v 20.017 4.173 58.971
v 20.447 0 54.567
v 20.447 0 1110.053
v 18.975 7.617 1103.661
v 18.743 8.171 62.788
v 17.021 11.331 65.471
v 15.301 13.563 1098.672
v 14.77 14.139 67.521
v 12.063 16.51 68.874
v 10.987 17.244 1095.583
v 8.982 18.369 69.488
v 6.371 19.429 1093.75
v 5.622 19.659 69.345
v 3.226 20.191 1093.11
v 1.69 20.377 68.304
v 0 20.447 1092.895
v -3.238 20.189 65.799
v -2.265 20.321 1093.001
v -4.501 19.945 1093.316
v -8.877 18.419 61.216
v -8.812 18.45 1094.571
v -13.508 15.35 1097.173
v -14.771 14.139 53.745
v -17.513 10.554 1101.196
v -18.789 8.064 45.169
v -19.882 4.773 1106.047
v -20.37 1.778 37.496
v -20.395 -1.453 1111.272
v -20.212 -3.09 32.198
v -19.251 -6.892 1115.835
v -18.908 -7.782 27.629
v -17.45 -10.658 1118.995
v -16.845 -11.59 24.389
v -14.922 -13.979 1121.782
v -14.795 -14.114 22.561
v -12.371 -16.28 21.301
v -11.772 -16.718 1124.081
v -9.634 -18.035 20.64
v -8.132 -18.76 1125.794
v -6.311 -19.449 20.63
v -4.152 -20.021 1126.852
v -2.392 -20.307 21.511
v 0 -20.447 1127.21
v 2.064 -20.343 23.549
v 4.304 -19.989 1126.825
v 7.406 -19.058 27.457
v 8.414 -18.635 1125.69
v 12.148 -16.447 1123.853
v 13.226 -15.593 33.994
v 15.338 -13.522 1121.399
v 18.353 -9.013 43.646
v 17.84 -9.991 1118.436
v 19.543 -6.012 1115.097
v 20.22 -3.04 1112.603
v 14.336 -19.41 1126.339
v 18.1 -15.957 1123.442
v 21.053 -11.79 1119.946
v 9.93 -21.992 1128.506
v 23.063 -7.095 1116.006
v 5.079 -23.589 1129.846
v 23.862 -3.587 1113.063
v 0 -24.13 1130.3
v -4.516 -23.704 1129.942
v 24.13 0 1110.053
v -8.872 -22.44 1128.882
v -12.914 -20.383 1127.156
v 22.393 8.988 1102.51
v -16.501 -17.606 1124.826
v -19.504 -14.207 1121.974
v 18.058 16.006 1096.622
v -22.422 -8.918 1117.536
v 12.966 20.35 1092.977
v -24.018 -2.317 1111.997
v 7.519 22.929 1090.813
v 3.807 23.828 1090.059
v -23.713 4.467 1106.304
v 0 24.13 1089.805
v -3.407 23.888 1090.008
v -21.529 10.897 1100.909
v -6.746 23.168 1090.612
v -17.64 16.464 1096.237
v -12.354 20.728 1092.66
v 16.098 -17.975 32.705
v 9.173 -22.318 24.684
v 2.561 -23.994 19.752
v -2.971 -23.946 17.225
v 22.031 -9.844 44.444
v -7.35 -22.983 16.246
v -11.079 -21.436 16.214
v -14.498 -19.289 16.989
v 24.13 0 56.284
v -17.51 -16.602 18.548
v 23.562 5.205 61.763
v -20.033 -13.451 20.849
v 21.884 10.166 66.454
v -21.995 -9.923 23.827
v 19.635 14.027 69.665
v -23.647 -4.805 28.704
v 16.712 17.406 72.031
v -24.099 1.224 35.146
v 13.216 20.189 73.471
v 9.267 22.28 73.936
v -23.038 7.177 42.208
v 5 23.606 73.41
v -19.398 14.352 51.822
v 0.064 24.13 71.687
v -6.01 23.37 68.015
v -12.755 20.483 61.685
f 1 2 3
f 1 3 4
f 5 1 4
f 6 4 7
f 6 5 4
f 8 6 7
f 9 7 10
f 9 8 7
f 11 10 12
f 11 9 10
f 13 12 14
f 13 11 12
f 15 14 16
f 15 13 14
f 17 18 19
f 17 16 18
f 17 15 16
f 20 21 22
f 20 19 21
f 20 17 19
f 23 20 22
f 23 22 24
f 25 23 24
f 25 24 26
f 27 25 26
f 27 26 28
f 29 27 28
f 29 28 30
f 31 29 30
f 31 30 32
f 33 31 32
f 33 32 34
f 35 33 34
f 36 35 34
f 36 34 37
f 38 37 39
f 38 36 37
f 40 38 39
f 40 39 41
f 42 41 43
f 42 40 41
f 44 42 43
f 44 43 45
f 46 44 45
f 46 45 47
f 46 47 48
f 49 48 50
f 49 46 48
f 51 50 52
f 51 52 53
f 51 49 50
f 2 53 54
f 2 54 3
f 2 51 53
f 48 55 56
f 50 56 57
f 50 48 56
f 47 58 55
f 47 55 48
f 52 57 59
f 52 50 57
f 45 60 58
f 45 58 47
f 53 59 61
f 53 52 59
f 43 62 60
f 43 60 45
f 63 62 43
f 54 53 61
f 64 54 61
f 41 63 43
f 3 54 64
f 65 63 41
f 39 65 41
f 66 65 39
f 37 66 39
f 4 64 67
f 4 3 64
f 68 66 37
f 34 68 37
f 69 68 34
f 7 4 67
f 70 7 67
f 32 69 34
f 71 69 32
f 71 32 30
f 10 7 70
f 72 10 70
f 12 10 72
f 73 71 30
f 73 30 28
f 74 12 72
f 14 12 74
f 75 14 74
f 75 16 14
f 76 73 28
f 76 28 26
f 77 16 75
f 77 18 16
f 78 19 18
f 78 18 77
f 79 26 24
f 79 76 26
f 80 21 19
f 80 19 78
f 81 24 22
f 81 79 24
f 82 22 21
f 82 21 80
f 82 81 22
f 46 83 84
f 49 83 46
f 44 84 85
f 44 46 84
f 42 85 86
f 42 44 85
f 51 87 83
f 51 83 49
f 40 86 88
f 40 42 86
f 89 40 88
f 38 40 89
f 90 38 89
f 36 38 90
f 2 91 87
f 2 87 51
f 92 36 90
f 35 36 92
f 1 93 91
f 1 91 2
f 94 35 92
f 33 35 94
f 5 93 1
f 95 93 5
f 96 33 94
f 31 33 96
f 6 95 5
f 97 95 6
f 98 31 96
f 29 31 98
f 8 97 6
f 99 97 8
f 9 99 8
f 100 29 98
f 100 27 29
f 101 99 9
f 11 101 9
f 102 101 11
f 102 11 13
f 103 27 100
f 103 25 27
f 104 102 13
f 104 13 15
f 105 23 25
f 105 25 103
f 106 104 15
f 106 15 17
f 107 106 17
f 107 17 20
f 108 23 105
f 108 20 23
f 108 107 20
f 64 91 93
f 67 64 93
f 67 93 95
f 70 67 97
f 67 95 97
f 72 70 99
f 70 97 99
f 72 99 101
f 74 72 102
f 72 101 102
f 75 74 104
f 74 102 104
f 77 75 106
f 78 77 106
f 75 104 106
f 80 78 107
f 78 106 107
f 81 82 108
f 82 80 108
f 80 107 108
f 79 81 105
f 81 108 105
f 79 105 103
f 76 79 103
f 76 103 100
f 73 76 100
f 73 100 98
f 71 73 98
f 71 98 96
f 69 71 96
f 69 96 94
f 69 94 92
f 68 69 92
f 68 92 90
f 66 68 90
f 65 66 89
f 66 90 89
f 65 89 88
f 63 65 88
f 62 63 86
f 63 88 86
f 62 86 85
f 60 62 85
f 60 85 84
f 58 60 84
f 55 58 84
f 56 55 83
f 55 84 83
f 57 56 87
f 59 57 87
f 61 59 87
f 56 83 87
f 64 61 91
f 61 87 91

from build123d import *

# Parameters (mm, degrees)
F0_R          = 24.13
F0_R_2        = 20.447
F1_DEPTH      = 1130.3
F3_DEPTH      = 24.131
F3_DEPTH_BACK = 24.131
F5_DEPTH      = 24.131
F5_DEPTH_BACK = 24.131
F8_W          = 230.4114792496
F8_H          = 177.8236068785
F9_DEPTH      = 25.4
F9_DEPTH_BACK = 20.32


with BuildPart() as f1:
    # F0 (on Top) → F1 (new body)
    with BuildSketch(Plane.XY):
        Circle(F0_R)
        Circle(F0_R_2, mode=Mode.SUBTRACT)
    extrude(amount=F1_DEPTH)

    # F2 (on Right) → F3 (cut, two sides)
    with BuildSketch(Plane.YZ) as f3_sk:
        Polygon((24.13, 1089.8050517994), (24.13, 1130.3), (-24.13, 1130.3), align=None)
    extrude(amount=-F3_DEPTH, mode=Mode.SUBTRACT)
    extrude(f3_sk.sketch, amount=F3_DEPTH_BACK, mode=Mode.SUBTRACT)

    # F4 (on Front) → F5 (cut, two sides)
    with BuildSketch(Plane.XZ) as f5_sk:
        Polygon((-28.575, 0), (28.575, 0), (28.575, 26.6494826636), align=None)
    extrude(amount=F5_DEPTH, mode=Mode.SUBTRACT)
    extrude(f5_sk.sketch, amount=-F5_DEPTH_BACK, mode=Mode.SUBTRACT)

    # F8 (on line) → F9 (cut, two sides)
    with BuildSketch(Plane(origin=(-2.5518360133, -6.0381584146, 5.4724299905), x_dir=(-0.9543044076, 0.2214273865, -0.2006813646), z_dir=(0.2988362387, 0.7071067812, -0.6408563821))) as f9_sk:
        with Locations((9.1961668804, 17.1195510775)):
            Rectangle(F8_W, F8_H)
    extrude(amount=F9_DEPTH, mode=Mode.SUBTRACT)
    extrude(f9_sk.sketch, amount=-F9_DEPTH_BACK, mode=Mode.SUBTRACT)


solid = f1.part
